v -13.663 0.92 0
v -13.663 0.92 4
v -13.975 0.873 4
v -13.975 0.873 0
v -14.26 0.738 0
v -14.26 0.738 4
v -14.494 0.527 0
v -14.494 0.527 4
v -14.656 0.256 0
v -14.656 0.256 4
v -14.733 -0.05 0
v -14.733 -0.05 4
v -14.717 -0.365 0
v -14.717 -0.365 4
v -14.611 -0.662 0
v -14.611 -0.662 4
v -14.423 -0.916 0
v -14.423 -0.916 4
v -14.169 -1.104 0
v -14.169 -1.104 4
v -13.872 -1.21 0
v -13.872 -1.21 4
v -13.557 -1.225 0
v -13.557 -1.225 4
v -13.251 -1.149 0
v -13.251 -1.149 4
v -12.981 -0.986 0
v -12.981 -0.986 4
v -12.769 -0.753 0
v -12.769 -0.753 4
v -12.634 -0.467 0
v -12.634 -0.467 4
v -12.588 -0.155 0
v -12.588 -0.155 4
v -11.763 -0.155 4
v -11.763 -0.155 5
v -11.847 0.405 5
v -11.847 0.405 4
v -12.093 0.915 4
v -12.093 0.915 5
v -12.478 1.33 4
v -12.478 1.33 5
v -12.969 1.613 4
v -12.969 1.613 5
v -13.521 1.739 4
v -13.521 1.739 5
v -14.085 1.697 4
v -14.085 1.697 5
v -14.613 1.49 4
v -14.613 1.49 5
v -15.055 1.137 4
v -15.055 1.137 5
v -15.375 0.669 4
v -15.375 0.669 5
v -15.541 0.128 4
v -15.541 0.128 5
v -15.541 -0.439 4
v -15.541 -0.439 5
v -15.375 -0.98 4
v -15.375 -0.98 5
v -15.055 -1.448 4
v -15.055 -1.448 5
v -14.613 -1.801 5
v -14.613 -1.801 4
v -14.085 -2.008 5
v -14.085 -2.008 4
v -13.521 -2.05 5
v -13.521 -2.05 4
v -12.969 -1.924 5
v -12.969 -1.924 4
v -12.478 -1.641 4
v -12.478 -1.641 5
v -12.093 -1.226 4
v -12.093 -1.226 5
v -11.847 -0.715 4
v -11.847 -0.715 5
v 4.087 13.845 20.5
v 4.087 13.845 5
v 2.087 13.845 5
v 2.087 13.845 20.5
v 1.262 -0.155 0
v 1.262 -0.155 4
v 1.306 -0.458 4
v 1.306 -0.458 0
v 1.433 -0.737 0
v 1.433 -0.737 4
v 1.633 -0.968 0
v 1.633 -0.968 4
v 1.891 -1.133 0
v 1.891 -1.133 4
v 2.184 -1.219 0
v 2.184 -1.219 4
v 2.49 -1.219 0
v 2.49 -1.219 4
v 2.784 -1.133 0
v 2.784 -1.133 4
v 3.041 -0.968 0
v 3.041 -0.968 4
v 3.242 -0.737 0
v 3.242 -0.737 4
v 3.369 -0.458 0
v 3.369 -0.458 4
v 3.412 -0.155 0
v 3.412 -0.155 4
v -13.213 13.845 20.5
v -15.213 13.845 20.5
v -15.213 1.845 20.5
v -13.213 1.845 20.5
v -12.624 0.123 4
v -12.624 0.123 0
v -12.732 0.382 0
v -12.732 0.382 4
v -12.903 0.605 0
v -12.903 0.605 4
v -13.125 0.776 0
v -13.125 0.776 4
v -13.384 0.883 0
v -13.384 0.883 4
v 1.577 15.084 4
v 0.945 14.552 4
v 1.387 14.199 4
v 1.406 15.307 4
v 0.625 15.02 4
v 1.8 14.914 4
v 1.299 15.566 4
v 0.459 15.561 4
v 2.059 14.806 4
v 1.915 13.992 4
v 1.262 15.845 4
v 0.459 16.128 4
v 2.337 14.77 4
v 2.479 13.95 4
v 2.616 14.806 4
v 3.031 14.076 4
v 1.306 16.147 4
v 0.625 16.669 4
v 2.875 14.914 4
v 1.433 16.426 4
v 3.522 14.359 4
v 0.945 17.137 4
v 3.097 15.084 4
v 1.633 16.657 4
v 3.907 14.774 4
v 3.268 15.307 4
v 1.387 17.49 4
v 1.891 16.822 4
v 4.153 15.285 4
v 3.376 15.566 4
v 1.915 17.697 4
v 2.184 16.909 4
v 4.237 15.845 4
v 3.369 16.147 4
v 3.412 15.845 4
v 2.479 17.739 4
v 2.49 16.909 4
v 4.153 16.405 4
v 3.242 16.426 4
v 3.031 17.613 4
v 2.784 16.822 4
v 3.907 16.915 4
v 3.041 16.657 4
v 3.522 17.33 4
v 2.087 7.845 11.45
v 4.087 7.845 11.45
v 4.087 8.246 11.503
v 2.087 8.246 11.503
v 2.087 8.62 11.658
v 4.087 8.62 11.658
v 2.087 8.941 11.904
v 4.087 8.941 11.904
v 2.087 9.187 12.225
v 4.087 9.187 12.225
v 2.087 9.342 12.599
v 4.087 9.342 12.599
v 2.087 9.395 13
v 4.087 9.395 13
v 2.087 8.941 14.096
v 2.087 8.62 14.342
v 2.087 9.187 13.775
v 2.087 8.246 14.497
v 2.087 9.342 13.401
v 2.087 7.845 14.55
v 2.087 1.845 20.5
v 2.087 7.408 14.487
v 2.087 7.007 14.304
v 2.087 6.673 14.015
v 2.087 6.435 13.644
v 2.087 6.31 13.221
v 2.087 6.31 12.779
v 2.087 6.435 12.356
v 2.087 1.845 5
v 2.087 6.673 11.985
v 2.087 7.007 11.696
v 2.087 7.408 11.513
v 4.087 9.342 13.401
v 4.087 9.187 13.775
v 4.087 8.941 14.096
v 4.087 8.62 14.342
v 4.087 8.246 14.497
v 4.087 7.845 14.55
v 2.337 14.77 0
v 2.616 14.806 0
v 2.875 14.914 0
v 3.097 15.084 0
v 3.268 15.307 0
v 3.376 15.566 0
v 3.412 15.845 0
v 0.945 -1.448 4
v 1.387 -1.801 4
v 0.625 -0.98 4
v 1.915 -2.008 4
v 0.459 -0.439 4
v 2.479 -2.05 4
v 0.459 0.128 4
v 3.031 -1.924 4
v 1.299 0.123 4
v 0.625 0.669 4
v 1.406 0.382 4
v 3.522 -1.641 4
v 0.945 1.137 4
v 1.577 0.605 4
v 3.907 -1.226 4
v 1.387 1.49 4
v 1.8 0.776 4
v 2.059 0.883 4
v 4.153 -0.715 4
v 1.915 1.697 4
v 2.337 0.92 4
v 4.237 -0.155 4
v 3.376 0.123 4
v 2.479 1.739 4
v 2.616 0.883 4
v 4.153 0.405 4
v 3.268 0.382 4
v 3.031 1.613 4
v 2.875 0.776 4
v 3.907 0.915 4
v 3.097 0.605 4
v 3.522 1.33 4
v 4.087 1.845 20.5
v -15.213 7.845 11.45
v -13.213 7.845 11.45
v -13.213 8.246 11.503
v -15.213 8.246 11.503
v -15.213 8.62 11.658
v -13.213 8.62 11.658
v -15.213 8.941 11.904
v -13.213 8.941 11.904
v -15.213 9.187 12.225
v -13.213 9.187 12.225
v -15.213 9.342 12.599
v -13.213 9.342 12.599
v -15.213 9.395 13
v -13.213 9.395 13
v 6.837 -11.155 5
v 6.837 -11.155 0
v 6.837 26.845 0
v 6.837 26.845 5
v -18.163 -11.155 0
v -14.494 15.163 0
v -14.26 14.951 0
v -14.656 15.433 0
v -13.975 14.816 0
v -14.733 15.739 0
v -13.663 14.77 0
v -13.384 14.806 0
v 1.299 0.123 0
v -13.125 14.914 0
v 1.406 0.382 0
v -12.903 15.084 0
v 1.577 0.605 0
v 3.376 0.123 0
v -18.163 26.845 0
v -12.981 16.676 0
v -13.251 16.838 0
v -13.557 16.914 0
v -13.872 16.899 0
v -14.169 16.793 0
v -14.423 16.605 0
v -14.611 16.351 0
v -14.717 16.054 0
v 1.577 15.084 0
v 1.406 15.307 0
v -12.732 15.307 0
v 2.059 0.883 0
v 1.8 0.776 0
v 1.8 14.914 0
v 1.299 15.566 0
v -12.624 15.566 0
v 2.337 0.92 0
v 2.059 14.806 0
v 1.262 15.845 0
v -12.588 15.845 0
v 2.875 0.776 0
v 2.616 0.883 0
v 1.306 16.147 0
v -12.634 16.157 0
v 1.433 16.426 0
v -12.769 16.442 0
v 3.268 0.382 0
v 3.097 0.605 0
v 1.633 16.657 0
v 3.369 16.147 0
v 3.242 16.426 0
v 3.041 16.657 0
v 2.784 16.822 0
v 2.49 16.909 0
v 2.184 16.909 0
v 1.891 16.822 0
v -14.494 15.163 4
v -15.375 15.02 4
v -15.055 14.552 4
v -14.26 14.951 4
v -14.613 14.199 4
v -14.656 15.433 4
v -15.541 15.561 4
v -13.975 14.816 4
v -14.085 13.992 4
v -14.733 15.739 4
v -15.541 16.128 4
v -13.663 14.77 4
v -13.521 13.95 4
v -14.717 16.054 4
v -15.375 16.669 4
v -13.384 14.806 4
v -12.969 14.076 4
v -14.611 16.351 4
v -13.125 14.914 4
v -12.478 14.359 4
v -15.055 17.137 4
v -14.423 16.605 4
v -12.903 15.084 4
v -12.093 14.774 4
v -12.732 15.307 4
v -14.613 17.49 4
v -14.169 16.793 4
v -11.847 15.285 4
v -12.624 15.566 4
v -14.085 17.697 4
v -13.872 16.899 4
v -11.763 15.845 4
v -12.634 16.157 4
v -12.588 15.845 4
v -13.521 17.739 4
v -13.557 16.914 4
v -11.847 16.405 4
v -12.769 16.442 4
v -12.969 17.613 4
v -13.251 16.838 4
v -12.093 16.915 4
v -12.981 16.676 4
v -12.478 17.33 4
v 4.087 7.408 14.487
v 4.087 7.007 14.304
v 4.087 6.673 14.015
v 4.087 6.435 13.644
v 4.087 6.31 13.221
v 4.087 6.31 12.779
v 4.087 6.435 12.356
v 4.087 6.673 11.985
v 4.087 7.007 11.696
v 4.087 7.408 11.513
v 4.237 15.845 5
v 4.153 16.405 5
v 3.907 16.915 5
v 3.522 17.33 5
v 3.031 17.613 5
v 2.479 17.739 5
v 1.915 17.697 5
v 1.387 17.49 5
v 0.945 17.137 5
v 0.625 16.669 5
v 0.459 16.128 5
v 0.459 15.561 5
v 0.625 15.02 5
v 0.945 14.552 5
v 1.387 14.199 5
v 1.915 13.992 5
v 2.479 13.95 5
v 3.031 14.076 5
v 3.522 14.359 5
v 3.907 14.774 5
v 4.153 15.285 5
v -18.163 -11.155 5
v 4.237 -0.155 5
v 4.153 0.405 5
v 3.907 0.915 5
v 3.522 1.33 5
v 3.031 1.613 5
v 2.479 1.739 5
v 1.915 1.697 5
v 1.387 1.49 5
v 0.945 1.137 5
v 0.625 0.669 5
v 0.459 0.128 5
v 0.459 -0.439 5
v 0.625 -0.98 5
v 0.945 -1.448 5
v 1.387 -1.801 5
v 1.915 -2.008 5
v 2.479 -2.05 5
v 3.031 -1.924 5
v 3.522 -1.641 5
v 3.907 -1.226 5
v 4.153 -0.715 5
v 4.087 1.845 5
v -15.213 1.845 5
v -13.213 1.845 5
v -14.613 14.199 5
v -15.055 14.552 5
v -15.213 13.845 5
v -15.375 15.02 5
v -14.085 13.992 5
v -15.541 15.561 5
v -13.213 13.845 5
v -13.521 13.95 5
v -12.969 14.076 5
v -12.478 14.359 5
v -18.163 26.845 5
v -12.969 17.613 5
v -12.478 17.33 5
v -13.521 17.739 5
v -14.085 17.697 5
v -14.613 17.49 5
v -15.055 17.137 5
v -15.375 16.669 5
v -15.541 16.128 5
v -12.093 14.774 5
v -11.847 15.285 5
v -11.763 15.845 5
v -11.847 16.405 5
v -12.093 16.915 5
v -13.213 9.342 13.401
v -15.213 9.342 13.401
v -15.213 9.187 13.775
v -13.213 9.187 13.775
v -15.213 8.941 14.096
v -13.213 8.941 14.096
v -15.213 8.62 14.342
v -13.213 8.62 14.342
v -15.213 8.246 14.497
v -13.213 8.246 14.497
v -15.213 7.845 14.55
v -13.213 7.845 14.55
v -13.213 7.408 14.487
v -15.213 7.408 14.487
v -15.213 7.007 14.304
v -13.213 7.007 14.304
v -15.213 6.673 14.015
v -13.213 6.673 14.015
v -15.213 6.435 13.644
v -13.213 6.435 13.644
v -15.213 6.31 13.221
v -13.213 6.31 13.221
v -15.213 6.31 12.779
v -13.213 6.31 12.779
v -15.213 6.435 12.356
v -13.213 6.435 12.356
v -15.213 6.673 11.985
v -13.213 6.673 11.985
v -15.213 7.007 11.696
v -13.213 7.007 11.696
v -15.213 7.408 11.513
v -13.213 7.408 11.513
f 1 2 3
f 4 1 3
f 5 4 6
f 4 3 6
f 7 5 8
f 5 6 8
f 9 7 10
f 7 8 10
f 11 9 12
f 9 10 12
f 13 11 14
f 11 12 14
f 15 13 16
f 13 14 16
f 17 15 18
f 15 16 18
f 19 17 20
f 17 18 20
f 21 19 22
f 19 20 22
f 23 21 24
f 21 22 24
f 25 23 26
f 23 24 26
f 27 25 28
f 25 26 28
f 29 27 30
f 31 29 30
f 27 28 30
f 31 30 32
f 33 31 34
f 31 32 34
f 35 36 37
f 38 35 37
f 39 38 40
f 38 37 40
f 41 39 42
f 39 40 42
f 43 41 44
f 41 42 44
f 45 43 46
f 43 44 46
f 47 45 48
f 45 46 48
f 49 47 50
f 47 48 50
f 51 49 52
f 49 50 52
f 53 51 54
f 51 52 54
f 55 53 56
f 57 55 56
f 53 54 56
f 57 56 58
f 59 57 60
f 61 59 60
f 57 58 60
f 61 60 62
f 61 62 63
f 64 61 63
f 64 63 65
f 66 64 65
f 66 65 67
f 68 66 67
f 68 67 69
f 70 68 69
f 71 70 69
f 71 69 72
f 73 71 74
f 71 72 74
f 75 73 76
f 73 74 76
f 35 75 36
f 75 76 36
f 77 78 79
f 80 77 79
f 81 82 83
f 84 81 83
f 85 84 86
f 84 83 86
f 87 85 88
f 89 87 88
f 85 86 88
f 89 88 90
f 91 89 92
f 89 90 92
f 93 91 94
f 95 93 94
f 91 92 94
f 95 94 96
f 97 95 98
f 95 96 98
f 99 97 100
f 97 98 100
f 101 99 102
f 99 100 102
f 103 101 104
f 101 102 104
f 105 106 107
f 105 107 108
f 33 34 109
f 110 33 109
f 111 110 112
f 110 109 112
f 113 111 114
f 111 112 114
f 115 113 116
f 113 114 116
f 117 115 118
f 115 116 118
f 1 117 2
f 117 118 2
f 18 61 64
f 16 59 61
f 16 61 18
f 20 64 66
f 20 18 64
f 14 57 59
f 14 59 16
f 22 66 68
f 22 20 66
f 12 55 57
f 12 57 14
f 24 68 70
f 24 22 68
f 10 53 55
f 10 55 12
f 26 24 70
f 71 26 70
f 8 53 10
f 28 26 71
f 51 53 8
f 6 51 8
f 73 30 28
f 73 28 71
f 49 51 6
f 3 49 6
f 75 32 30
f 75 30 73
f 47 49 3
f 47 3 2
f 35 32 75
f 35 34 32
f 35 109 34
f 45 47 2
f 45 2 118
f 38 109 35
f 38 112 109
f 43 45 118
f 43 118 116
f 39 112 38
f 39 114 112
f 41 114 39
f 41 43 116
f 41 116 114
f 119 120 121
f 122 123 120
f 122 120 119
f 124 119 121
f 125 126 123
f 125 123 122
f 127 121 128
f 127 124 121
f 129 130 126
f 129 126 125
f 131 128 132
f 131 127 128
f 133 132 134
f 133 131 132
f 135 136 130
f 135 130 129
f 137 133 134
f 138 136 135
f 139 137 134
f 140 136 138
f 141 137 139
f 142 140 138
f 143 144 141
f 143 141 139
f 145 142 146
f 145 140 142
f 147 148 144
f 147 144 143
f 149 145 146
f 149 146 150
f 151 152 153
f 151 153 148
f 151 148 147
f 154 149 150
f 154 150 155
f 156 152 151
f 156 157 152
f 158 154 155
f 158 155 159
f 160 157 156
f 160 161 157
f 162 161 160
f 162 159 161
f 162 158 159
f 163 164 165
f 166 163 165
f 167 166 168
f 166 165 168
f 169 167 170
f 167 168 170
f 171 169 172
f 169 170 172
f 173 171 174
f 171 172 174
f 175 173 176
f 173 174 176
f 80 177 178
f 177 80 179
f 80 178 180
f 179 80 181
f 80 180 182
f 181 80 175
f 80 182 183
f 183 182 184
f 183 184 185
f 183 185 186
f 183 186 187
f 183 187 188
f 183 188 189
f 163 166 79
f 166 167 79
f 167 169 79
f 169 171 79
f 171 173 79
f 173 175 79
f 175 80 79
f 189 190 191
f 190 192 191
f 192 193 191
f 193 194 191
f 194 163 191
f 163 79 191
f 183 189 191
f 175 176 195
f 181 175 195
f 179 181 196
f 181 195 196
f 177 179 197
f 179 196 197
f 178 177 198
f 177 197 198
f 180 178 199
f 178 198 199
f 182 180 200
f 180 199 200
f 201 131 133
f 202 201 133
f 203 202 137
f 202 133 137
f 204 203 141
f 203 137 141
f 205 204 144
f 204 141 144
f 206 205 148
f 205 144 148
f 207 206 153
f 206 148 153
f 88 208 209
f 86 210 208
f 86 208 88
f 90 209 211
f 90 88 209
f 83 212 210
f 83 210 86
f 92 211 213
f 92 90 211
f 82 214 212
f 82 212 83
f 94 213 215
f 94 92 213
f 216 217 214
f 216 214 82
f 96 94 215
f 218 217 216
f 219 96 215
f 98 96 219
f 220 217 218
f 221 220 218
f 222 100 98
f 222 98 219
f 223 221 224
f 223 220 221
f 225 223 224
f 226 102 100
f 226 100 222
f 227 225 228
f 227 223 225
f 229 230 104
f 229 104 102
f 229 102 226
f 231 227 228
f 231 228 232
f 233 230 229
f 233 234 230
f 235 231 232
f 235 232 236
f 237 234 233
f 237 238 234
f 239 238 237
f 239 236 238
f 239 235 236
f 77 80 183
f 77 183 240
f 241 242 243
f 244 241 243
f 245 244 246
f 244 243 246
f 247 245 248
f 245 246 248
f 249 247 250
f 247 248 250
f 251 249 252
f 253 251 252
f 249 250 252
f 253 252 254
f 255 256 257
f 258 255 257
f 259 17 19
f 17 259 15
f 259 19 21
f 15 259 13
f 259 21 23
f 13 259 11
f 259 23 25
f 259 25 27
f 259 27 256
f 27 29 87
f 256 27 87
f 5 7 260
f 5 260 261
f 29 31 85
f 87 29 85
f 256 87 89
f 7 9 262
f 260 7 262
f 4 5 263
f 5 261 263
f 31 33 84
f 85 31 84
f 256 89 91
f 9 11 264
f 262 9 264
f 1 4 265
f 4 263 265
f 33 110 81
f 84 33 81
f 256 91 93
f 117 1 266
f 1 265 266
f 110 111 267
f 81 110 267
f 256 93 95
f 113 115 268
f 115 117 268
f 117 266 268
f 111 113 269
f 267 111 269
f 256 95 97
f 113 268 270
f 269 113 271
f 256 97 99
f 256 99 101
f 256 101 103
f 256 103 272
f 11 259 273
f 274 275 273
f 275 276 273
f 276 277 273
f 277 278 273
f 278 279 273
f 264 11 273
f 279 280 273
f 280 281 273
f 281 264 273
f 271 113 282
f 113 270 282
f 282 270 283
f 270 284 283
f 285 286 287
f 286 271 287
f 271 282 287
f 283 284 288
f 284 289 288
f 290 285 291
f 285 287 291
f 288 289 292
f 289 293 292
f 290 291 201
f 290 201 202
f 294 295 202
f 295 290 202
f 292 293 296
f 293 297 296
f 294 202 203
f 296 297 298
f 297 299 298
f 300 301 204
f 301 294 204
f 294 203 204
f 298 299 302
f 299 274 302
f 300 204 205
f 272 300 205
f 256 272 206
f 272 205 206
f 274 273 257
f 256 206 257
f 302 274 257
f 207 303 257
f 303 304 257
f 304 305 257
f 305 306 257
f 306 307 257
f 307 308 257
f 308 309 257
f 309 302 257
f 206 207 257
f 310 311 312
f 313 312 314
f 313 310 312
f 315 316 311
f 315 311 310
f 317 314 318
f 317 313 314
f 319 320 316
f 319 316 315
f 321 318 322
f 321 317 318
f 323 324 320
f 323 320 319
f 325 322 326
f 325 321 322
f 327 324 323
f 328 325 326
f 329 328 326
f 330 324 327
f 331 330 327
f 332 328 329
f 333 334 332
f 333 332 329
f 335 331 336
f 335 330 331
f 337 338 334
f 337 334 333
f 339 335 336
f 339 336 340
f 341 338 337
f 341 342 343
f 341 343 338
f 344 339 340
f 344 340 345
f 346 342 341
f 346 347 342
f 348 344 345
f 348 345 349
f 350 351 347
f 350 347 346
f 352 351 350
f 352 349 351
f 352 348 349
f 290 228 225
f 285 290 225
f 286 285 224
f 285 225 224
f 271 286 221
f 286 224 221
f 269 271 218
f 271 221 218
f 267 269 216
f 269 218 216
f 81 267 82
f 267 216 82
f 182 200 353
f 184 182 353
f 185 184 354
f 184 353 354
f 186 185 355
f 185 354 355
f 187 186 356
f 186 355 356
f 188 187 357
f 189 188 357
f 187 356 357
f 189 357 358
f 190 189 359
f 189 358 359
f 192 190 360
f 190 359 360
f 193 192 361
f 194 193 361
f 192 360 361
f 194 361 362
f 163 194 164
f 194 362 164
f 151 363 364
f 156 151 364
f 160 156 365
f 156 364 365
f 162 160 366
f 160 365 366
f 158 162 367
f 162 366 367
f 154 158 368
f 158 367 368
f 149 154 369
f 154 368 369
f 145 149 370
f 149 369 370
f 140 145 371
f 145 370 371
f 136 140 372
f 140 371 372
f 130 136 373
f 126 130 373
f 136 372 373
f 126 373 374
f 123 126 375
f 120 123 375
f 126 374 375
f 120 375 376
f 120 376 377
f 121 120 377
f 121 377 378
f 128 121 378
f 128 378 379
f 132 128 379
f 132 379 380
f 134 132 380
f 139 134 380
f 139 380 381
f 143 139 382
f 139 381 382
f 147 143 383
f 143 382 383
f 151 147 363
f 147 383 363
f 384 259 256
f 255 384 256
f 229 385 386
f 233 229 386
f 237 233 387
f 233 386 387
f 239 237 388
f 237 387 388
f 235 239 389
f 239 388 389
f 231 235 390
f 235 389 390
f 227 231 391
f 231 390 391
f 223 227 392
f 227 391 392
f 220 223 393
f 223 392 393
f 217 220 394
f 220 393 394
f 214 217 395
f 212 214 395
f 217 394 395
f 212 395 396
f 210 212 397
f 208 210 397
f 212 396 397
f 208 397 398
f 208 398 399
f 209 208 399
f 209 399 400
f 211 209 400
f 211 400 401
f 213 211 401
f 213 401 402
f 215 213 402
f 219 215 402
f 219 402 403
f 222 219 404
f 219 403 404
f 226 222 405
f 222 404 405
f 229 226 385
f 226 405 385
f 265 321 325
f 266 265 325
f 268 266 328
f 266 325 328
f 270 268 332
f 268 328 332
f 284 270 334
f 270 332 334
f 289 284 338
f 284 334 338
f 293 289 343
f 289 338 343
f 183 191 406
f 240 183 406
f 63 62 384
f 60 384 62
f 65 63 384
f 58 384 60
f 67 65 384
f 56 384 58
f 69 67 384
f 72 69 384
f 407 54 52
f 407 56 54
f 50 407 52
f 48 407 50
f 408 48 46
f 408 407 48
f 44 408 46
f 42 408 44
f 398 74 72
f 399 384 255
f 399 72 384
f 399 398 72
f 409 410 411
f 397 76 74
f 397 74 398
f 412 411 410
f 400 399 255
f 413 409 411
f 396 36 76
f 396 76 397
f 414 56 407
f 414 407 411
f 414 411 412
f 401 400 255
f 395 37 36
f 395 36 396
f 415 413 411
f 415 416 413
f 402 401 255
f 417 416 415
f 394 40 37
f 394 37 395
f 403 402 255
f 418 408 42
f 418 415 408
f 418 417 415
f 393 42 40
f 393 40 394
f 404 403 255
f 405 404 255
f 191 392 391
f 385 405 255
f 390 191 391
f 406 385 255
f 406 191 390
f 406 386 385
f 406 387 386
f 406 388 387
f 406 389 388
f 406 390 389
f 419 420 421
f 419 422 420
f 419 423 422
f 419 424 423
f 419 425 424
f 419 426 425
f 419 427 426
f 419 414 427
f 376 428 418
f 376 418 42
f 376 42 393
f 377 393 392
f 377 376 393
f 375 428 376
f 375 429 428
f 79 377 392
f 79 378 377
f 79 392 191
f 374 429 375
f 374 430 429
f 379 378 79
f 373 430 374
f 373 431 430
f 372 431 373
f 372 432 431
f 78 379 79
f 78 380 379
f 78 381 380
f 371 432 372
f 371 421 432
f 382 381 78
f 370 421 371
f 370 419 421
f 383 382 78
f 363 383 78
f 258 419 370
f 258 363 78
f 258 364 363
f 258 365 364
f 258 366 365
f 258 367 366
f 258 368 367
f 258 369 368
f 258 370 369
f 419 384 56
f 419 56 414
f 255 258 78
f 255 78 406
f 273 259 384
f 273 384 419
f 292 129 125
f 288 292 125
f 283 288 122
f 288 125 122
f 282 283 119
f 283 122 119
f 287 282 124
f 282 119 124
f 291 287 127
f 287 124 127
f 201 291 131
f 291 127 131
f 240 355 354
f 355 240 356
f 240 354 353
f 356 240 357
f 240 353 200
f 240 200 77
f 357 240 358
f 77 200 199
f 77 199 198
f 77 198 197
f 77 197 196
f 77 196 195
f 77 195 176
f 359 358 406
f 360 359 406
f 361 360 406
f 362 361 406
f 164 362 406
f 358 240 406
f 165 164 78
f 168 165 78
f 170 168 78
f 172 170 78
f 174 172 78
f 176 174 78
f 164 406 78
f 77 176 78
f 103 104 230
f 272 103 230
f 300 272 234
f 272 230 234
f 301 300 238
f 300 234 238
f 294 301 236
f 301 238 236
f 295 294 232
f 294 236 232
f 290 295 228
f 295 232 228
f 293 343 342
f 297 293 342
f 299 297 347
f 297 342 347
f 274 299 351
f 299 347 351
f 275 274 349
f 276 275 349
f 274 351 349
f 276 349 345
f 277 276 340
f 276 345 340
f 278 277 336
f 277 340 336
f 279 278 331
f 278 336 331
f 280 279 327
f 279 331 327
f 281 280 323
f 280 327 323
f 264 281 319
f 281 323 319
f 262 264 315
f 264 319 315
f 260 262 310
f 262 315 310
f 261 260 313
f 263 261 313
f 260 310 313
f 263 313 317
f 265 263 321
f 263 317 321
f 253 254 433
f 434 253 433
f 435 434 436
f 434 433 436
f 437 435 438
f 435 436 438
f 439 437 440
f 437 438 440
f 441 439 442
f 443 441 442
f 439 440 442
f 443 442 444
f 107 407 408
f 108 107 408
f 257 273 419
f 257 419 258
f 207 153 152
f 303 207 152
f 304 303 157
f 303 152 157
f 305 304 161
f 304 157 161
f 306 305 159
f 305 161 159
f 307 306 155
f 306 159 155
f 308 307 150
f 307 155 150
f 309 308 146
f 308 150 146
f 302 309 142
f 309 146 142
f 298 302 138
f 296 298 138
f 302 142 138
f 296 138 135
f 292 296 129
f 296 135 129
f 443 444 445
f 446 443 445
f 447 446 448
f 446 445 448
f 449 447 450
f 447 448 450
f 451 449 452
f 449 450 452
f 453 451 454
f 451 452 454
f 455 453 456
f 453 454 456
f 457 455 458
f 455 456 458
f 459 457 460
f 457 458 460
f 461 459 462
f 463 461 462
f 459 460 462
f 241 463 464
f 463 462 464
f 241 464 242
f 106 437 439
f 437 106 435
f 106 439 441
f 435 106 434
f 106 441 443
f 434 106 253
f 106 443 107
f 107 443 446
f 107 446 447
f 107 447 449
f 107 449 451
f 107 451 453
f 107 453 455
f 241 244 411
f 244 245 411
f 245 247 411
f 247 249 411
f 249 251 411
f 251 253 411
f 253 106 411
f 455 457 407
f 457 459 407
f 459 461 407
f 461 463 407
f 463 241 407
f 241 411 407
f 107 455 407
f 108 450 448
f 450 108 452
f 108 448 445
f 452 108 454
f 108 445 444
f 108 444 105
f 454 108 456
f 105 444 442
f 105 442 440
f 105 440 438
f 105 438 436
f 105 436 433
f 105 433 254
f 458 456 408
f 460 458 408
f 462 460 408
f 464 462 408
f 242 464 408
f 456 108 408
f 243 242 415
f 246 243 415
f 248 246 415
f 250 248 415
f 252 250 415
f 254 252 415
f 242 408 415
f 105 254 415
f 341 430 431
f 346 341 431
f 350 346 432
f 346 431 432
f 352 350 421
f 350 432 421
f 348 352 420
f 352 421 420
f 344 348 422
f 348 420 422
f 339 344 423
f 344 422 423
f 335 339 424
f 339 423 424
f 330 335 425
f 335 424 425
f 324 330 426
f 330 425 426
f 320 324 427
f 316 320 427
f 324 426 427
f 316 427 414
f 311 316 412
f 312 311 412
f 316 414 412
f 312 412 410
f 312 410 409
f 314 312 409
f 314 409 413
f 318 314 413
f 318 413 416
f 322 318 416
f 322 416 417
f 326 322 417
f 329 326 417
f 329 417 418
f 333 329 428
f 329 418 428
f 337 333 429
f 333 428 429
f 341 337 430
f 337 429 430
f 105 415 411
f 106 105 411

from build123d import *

# Parameters (mm, degrees)
F0_W     = 25
F0_H     = 38
F1_DEPTH = 5
F3_DEPTH = 5
F5_DEPTH = 15.5
F7_DEPTH = 25
F8_R     = 1.9
F9_DEPTH = 1


# Not quite as in the source:
# - a feature names something its author has since deleted; it is built from what else it names


with BuildPart() as f1:
    # F0 (on Top) → F1 (new body)
    with BuildSketch(Plane.XY):
        with Locations((-5.6626851261, 7.8445598302)):
            Rectangle(F0_W, F0_H)
    extrude(amount=F1_DEPTH)

    # F2 (on face) → F3 (cut)
    with BuildSketch(Plane.XY.offset(5)):
        with BuildLine():
            Line((-13.6626851261, 15.8445598302), (-12.5876851261, 15.8445598302))
            ThreePointArc((-12.5876851261, 15.8445598302), (-14.4228249158, 16.60469962), (-13.6626851261, 14.7695598302))
            Line((-13.6626851261, 14.7695598302), (-13.6626851261, 15.8445598302))
        make_face()
        with BuildLine():
            ThreePointArc((-13.6626851261, 14.7695598302), (-12.9025453363, 15.0844200404), (-12.5876851261, 15.8445598302))
            Line((-12.5876851261, 15.8445598302), (-13.6626851261, 15.8445598302))
            Line((-13.6626851261, 15.8445598302), (-13.6626851261, 14.7695598302))
        make_face()
        with BuildLine():
            Line((2.3373148739, 15.8445598302), (1.2623148739, 15.8445598302))
            ThreePointArc((1.2623148739, 15.8445598302), (1.5771750842, 15.0844200404), (2.3373148739, 14.7695598302))
            Line((2.3373148739, 14.7695598302), (2.3373148739, 15.8445598302))
        make_face()
        with BuildLine():
            ThreePointArc((3.4123148739, 15.8445598302), (2.3373148739, 16.9195598302), (1.2623148739, 15.8445598302))
            Line((1.2623148739, 15.8445598302), (2.3373148739, 15.8445598302))
            Line((2.3373148739, 15.8445598302), (2.3373148739, 14.7695598302))
            ThreePointArc((2.3373148739, 14.7695598302), (3.0974546637, 15.0844200404), (3.4123148739, 15.8445598302))
        make_face()
        with BuildLine():
            Line((-13.6626851261, -0.1554401698), (-13.6626851261, 0.9195598302))
            ThreePointArc((-13.6626851261, 0.9195598302), (-14.4228249158, -0.9155799596), (-12.5876851261, -0.1554401698))
            Line((-12.5876851261, -0.1554401698), (-13.6626851261, -0.1554401698))
        make_face()
        with BuildLine():
            ThreePointArc((-12.5876851261, -0.1554401698), (-12.9025453363, 0.60469962), (-13.6626851261, 0.9195598302))
            Line((-13.6626851261, 0.9195598302), (-13.6626851261, -0.1554401698))
            Line((-13.6626851261, -0.1554401698), (-12.5876851261, -0.1554401698))
        make_face()
        with BuildLine():
            Line((2.3373148739, -0.1554401698), (2.3373148739, 0.9195598302))
            ThreePointArc((2.3373148739, 0.9195598302), (1.5771750842, 0.60469962), (1.2623148739, -0.1554401698))
            Line((1.2623148739, -0.1554401698), (2.3373148739, -0.1554401698))
        make_face()
        with BuildLine():
            ThreePointArc((3.4123148739, -0.1554401698), (3.0974546637, 0.60469962), (2.3373148739, 0.9195598302))
            Line((2.3373148739, 0.9195598302), (2.3373148739, -0.1554401698))
            Line((2.3373148739, -0.1554401698), (1.2623148739, -0.1554401698))
            ThreePointArc((1.2623148739, -0.1554401698), (2.3373148739, -1.2304401698), (3.4123148739, -0.1554401698))
        make_face()
    extrude(amount=-F3_DEPTH, mode=Mode.SUBTRACT)

    # F4 (on face) → F5 (join)
    with BuildSketch(Plane.XY.offset(5)):
        Polygon((-15.2126851261, 13.8445598302), (-15.2126851261, 1.8445598302), (-14.2126851261, 1.8445598302), (-13.2126851261, 1.8445598302), (-13.2126851261, 13.8445598302), (-14.2126851261, 13.8445598302), align=None)
        Polygon((4.0873148739, 13.8445598302), (3.0873148739, 13.8445598302), (2.0873148739, 13.8445598302), (2.0873148739, 1.8445598302), (4.0873148739, 1.8445598302), align=None)
    extrude(amount=F5_DEPTH)

    # F6 (on face) → F7 (cut)
    with BuildSketch(Plane.YZ.offset(4.0873148739)):
        with BuildLine():
            Line((7.8445598302, 11.45), (7.8445598302, 14.55))
            ThreePointArc((7.8445598302, 14.55), (6.2945598302, 13), (7.8445598302, 11.45))
        make_face()
        with BuildLine():
            ThreePointArc((7.8445598302, 11.45), (8.9405753411, 11.9039844892), (9.3945598302, 13))
            ThreePointArc((9.3945598302, 13), (8.9405753411, 14.0960155108), (7.8445598302, 14.55))
            Line((7.8445598302, 14.55), (7.8445598302, 11.45))
        make_face()
    extrude(amount=-F7_DEPTH, mode=Mode.SUBTRACT)

    # F8 (on face) → F9 (cut)
    with BuildSketch(Plane.XY.offset(5)):
        with Locations((-13.6626851261, 15.8445598302)):
            Circle(F8_R)
        with Locations((2.3373148739, 15.8445598302)):
            Circle(F8_R)
        with Locations((2.3373148739, -0.1554401698)):
            Circle(F8_R)
        with Locations((-13.6626851261, -0.1554401698)):
            Circle(F8_R)
    extrude(amount=-F9_DEPTH, mode=Mode.SUBTRACT)


solid = f1.part
